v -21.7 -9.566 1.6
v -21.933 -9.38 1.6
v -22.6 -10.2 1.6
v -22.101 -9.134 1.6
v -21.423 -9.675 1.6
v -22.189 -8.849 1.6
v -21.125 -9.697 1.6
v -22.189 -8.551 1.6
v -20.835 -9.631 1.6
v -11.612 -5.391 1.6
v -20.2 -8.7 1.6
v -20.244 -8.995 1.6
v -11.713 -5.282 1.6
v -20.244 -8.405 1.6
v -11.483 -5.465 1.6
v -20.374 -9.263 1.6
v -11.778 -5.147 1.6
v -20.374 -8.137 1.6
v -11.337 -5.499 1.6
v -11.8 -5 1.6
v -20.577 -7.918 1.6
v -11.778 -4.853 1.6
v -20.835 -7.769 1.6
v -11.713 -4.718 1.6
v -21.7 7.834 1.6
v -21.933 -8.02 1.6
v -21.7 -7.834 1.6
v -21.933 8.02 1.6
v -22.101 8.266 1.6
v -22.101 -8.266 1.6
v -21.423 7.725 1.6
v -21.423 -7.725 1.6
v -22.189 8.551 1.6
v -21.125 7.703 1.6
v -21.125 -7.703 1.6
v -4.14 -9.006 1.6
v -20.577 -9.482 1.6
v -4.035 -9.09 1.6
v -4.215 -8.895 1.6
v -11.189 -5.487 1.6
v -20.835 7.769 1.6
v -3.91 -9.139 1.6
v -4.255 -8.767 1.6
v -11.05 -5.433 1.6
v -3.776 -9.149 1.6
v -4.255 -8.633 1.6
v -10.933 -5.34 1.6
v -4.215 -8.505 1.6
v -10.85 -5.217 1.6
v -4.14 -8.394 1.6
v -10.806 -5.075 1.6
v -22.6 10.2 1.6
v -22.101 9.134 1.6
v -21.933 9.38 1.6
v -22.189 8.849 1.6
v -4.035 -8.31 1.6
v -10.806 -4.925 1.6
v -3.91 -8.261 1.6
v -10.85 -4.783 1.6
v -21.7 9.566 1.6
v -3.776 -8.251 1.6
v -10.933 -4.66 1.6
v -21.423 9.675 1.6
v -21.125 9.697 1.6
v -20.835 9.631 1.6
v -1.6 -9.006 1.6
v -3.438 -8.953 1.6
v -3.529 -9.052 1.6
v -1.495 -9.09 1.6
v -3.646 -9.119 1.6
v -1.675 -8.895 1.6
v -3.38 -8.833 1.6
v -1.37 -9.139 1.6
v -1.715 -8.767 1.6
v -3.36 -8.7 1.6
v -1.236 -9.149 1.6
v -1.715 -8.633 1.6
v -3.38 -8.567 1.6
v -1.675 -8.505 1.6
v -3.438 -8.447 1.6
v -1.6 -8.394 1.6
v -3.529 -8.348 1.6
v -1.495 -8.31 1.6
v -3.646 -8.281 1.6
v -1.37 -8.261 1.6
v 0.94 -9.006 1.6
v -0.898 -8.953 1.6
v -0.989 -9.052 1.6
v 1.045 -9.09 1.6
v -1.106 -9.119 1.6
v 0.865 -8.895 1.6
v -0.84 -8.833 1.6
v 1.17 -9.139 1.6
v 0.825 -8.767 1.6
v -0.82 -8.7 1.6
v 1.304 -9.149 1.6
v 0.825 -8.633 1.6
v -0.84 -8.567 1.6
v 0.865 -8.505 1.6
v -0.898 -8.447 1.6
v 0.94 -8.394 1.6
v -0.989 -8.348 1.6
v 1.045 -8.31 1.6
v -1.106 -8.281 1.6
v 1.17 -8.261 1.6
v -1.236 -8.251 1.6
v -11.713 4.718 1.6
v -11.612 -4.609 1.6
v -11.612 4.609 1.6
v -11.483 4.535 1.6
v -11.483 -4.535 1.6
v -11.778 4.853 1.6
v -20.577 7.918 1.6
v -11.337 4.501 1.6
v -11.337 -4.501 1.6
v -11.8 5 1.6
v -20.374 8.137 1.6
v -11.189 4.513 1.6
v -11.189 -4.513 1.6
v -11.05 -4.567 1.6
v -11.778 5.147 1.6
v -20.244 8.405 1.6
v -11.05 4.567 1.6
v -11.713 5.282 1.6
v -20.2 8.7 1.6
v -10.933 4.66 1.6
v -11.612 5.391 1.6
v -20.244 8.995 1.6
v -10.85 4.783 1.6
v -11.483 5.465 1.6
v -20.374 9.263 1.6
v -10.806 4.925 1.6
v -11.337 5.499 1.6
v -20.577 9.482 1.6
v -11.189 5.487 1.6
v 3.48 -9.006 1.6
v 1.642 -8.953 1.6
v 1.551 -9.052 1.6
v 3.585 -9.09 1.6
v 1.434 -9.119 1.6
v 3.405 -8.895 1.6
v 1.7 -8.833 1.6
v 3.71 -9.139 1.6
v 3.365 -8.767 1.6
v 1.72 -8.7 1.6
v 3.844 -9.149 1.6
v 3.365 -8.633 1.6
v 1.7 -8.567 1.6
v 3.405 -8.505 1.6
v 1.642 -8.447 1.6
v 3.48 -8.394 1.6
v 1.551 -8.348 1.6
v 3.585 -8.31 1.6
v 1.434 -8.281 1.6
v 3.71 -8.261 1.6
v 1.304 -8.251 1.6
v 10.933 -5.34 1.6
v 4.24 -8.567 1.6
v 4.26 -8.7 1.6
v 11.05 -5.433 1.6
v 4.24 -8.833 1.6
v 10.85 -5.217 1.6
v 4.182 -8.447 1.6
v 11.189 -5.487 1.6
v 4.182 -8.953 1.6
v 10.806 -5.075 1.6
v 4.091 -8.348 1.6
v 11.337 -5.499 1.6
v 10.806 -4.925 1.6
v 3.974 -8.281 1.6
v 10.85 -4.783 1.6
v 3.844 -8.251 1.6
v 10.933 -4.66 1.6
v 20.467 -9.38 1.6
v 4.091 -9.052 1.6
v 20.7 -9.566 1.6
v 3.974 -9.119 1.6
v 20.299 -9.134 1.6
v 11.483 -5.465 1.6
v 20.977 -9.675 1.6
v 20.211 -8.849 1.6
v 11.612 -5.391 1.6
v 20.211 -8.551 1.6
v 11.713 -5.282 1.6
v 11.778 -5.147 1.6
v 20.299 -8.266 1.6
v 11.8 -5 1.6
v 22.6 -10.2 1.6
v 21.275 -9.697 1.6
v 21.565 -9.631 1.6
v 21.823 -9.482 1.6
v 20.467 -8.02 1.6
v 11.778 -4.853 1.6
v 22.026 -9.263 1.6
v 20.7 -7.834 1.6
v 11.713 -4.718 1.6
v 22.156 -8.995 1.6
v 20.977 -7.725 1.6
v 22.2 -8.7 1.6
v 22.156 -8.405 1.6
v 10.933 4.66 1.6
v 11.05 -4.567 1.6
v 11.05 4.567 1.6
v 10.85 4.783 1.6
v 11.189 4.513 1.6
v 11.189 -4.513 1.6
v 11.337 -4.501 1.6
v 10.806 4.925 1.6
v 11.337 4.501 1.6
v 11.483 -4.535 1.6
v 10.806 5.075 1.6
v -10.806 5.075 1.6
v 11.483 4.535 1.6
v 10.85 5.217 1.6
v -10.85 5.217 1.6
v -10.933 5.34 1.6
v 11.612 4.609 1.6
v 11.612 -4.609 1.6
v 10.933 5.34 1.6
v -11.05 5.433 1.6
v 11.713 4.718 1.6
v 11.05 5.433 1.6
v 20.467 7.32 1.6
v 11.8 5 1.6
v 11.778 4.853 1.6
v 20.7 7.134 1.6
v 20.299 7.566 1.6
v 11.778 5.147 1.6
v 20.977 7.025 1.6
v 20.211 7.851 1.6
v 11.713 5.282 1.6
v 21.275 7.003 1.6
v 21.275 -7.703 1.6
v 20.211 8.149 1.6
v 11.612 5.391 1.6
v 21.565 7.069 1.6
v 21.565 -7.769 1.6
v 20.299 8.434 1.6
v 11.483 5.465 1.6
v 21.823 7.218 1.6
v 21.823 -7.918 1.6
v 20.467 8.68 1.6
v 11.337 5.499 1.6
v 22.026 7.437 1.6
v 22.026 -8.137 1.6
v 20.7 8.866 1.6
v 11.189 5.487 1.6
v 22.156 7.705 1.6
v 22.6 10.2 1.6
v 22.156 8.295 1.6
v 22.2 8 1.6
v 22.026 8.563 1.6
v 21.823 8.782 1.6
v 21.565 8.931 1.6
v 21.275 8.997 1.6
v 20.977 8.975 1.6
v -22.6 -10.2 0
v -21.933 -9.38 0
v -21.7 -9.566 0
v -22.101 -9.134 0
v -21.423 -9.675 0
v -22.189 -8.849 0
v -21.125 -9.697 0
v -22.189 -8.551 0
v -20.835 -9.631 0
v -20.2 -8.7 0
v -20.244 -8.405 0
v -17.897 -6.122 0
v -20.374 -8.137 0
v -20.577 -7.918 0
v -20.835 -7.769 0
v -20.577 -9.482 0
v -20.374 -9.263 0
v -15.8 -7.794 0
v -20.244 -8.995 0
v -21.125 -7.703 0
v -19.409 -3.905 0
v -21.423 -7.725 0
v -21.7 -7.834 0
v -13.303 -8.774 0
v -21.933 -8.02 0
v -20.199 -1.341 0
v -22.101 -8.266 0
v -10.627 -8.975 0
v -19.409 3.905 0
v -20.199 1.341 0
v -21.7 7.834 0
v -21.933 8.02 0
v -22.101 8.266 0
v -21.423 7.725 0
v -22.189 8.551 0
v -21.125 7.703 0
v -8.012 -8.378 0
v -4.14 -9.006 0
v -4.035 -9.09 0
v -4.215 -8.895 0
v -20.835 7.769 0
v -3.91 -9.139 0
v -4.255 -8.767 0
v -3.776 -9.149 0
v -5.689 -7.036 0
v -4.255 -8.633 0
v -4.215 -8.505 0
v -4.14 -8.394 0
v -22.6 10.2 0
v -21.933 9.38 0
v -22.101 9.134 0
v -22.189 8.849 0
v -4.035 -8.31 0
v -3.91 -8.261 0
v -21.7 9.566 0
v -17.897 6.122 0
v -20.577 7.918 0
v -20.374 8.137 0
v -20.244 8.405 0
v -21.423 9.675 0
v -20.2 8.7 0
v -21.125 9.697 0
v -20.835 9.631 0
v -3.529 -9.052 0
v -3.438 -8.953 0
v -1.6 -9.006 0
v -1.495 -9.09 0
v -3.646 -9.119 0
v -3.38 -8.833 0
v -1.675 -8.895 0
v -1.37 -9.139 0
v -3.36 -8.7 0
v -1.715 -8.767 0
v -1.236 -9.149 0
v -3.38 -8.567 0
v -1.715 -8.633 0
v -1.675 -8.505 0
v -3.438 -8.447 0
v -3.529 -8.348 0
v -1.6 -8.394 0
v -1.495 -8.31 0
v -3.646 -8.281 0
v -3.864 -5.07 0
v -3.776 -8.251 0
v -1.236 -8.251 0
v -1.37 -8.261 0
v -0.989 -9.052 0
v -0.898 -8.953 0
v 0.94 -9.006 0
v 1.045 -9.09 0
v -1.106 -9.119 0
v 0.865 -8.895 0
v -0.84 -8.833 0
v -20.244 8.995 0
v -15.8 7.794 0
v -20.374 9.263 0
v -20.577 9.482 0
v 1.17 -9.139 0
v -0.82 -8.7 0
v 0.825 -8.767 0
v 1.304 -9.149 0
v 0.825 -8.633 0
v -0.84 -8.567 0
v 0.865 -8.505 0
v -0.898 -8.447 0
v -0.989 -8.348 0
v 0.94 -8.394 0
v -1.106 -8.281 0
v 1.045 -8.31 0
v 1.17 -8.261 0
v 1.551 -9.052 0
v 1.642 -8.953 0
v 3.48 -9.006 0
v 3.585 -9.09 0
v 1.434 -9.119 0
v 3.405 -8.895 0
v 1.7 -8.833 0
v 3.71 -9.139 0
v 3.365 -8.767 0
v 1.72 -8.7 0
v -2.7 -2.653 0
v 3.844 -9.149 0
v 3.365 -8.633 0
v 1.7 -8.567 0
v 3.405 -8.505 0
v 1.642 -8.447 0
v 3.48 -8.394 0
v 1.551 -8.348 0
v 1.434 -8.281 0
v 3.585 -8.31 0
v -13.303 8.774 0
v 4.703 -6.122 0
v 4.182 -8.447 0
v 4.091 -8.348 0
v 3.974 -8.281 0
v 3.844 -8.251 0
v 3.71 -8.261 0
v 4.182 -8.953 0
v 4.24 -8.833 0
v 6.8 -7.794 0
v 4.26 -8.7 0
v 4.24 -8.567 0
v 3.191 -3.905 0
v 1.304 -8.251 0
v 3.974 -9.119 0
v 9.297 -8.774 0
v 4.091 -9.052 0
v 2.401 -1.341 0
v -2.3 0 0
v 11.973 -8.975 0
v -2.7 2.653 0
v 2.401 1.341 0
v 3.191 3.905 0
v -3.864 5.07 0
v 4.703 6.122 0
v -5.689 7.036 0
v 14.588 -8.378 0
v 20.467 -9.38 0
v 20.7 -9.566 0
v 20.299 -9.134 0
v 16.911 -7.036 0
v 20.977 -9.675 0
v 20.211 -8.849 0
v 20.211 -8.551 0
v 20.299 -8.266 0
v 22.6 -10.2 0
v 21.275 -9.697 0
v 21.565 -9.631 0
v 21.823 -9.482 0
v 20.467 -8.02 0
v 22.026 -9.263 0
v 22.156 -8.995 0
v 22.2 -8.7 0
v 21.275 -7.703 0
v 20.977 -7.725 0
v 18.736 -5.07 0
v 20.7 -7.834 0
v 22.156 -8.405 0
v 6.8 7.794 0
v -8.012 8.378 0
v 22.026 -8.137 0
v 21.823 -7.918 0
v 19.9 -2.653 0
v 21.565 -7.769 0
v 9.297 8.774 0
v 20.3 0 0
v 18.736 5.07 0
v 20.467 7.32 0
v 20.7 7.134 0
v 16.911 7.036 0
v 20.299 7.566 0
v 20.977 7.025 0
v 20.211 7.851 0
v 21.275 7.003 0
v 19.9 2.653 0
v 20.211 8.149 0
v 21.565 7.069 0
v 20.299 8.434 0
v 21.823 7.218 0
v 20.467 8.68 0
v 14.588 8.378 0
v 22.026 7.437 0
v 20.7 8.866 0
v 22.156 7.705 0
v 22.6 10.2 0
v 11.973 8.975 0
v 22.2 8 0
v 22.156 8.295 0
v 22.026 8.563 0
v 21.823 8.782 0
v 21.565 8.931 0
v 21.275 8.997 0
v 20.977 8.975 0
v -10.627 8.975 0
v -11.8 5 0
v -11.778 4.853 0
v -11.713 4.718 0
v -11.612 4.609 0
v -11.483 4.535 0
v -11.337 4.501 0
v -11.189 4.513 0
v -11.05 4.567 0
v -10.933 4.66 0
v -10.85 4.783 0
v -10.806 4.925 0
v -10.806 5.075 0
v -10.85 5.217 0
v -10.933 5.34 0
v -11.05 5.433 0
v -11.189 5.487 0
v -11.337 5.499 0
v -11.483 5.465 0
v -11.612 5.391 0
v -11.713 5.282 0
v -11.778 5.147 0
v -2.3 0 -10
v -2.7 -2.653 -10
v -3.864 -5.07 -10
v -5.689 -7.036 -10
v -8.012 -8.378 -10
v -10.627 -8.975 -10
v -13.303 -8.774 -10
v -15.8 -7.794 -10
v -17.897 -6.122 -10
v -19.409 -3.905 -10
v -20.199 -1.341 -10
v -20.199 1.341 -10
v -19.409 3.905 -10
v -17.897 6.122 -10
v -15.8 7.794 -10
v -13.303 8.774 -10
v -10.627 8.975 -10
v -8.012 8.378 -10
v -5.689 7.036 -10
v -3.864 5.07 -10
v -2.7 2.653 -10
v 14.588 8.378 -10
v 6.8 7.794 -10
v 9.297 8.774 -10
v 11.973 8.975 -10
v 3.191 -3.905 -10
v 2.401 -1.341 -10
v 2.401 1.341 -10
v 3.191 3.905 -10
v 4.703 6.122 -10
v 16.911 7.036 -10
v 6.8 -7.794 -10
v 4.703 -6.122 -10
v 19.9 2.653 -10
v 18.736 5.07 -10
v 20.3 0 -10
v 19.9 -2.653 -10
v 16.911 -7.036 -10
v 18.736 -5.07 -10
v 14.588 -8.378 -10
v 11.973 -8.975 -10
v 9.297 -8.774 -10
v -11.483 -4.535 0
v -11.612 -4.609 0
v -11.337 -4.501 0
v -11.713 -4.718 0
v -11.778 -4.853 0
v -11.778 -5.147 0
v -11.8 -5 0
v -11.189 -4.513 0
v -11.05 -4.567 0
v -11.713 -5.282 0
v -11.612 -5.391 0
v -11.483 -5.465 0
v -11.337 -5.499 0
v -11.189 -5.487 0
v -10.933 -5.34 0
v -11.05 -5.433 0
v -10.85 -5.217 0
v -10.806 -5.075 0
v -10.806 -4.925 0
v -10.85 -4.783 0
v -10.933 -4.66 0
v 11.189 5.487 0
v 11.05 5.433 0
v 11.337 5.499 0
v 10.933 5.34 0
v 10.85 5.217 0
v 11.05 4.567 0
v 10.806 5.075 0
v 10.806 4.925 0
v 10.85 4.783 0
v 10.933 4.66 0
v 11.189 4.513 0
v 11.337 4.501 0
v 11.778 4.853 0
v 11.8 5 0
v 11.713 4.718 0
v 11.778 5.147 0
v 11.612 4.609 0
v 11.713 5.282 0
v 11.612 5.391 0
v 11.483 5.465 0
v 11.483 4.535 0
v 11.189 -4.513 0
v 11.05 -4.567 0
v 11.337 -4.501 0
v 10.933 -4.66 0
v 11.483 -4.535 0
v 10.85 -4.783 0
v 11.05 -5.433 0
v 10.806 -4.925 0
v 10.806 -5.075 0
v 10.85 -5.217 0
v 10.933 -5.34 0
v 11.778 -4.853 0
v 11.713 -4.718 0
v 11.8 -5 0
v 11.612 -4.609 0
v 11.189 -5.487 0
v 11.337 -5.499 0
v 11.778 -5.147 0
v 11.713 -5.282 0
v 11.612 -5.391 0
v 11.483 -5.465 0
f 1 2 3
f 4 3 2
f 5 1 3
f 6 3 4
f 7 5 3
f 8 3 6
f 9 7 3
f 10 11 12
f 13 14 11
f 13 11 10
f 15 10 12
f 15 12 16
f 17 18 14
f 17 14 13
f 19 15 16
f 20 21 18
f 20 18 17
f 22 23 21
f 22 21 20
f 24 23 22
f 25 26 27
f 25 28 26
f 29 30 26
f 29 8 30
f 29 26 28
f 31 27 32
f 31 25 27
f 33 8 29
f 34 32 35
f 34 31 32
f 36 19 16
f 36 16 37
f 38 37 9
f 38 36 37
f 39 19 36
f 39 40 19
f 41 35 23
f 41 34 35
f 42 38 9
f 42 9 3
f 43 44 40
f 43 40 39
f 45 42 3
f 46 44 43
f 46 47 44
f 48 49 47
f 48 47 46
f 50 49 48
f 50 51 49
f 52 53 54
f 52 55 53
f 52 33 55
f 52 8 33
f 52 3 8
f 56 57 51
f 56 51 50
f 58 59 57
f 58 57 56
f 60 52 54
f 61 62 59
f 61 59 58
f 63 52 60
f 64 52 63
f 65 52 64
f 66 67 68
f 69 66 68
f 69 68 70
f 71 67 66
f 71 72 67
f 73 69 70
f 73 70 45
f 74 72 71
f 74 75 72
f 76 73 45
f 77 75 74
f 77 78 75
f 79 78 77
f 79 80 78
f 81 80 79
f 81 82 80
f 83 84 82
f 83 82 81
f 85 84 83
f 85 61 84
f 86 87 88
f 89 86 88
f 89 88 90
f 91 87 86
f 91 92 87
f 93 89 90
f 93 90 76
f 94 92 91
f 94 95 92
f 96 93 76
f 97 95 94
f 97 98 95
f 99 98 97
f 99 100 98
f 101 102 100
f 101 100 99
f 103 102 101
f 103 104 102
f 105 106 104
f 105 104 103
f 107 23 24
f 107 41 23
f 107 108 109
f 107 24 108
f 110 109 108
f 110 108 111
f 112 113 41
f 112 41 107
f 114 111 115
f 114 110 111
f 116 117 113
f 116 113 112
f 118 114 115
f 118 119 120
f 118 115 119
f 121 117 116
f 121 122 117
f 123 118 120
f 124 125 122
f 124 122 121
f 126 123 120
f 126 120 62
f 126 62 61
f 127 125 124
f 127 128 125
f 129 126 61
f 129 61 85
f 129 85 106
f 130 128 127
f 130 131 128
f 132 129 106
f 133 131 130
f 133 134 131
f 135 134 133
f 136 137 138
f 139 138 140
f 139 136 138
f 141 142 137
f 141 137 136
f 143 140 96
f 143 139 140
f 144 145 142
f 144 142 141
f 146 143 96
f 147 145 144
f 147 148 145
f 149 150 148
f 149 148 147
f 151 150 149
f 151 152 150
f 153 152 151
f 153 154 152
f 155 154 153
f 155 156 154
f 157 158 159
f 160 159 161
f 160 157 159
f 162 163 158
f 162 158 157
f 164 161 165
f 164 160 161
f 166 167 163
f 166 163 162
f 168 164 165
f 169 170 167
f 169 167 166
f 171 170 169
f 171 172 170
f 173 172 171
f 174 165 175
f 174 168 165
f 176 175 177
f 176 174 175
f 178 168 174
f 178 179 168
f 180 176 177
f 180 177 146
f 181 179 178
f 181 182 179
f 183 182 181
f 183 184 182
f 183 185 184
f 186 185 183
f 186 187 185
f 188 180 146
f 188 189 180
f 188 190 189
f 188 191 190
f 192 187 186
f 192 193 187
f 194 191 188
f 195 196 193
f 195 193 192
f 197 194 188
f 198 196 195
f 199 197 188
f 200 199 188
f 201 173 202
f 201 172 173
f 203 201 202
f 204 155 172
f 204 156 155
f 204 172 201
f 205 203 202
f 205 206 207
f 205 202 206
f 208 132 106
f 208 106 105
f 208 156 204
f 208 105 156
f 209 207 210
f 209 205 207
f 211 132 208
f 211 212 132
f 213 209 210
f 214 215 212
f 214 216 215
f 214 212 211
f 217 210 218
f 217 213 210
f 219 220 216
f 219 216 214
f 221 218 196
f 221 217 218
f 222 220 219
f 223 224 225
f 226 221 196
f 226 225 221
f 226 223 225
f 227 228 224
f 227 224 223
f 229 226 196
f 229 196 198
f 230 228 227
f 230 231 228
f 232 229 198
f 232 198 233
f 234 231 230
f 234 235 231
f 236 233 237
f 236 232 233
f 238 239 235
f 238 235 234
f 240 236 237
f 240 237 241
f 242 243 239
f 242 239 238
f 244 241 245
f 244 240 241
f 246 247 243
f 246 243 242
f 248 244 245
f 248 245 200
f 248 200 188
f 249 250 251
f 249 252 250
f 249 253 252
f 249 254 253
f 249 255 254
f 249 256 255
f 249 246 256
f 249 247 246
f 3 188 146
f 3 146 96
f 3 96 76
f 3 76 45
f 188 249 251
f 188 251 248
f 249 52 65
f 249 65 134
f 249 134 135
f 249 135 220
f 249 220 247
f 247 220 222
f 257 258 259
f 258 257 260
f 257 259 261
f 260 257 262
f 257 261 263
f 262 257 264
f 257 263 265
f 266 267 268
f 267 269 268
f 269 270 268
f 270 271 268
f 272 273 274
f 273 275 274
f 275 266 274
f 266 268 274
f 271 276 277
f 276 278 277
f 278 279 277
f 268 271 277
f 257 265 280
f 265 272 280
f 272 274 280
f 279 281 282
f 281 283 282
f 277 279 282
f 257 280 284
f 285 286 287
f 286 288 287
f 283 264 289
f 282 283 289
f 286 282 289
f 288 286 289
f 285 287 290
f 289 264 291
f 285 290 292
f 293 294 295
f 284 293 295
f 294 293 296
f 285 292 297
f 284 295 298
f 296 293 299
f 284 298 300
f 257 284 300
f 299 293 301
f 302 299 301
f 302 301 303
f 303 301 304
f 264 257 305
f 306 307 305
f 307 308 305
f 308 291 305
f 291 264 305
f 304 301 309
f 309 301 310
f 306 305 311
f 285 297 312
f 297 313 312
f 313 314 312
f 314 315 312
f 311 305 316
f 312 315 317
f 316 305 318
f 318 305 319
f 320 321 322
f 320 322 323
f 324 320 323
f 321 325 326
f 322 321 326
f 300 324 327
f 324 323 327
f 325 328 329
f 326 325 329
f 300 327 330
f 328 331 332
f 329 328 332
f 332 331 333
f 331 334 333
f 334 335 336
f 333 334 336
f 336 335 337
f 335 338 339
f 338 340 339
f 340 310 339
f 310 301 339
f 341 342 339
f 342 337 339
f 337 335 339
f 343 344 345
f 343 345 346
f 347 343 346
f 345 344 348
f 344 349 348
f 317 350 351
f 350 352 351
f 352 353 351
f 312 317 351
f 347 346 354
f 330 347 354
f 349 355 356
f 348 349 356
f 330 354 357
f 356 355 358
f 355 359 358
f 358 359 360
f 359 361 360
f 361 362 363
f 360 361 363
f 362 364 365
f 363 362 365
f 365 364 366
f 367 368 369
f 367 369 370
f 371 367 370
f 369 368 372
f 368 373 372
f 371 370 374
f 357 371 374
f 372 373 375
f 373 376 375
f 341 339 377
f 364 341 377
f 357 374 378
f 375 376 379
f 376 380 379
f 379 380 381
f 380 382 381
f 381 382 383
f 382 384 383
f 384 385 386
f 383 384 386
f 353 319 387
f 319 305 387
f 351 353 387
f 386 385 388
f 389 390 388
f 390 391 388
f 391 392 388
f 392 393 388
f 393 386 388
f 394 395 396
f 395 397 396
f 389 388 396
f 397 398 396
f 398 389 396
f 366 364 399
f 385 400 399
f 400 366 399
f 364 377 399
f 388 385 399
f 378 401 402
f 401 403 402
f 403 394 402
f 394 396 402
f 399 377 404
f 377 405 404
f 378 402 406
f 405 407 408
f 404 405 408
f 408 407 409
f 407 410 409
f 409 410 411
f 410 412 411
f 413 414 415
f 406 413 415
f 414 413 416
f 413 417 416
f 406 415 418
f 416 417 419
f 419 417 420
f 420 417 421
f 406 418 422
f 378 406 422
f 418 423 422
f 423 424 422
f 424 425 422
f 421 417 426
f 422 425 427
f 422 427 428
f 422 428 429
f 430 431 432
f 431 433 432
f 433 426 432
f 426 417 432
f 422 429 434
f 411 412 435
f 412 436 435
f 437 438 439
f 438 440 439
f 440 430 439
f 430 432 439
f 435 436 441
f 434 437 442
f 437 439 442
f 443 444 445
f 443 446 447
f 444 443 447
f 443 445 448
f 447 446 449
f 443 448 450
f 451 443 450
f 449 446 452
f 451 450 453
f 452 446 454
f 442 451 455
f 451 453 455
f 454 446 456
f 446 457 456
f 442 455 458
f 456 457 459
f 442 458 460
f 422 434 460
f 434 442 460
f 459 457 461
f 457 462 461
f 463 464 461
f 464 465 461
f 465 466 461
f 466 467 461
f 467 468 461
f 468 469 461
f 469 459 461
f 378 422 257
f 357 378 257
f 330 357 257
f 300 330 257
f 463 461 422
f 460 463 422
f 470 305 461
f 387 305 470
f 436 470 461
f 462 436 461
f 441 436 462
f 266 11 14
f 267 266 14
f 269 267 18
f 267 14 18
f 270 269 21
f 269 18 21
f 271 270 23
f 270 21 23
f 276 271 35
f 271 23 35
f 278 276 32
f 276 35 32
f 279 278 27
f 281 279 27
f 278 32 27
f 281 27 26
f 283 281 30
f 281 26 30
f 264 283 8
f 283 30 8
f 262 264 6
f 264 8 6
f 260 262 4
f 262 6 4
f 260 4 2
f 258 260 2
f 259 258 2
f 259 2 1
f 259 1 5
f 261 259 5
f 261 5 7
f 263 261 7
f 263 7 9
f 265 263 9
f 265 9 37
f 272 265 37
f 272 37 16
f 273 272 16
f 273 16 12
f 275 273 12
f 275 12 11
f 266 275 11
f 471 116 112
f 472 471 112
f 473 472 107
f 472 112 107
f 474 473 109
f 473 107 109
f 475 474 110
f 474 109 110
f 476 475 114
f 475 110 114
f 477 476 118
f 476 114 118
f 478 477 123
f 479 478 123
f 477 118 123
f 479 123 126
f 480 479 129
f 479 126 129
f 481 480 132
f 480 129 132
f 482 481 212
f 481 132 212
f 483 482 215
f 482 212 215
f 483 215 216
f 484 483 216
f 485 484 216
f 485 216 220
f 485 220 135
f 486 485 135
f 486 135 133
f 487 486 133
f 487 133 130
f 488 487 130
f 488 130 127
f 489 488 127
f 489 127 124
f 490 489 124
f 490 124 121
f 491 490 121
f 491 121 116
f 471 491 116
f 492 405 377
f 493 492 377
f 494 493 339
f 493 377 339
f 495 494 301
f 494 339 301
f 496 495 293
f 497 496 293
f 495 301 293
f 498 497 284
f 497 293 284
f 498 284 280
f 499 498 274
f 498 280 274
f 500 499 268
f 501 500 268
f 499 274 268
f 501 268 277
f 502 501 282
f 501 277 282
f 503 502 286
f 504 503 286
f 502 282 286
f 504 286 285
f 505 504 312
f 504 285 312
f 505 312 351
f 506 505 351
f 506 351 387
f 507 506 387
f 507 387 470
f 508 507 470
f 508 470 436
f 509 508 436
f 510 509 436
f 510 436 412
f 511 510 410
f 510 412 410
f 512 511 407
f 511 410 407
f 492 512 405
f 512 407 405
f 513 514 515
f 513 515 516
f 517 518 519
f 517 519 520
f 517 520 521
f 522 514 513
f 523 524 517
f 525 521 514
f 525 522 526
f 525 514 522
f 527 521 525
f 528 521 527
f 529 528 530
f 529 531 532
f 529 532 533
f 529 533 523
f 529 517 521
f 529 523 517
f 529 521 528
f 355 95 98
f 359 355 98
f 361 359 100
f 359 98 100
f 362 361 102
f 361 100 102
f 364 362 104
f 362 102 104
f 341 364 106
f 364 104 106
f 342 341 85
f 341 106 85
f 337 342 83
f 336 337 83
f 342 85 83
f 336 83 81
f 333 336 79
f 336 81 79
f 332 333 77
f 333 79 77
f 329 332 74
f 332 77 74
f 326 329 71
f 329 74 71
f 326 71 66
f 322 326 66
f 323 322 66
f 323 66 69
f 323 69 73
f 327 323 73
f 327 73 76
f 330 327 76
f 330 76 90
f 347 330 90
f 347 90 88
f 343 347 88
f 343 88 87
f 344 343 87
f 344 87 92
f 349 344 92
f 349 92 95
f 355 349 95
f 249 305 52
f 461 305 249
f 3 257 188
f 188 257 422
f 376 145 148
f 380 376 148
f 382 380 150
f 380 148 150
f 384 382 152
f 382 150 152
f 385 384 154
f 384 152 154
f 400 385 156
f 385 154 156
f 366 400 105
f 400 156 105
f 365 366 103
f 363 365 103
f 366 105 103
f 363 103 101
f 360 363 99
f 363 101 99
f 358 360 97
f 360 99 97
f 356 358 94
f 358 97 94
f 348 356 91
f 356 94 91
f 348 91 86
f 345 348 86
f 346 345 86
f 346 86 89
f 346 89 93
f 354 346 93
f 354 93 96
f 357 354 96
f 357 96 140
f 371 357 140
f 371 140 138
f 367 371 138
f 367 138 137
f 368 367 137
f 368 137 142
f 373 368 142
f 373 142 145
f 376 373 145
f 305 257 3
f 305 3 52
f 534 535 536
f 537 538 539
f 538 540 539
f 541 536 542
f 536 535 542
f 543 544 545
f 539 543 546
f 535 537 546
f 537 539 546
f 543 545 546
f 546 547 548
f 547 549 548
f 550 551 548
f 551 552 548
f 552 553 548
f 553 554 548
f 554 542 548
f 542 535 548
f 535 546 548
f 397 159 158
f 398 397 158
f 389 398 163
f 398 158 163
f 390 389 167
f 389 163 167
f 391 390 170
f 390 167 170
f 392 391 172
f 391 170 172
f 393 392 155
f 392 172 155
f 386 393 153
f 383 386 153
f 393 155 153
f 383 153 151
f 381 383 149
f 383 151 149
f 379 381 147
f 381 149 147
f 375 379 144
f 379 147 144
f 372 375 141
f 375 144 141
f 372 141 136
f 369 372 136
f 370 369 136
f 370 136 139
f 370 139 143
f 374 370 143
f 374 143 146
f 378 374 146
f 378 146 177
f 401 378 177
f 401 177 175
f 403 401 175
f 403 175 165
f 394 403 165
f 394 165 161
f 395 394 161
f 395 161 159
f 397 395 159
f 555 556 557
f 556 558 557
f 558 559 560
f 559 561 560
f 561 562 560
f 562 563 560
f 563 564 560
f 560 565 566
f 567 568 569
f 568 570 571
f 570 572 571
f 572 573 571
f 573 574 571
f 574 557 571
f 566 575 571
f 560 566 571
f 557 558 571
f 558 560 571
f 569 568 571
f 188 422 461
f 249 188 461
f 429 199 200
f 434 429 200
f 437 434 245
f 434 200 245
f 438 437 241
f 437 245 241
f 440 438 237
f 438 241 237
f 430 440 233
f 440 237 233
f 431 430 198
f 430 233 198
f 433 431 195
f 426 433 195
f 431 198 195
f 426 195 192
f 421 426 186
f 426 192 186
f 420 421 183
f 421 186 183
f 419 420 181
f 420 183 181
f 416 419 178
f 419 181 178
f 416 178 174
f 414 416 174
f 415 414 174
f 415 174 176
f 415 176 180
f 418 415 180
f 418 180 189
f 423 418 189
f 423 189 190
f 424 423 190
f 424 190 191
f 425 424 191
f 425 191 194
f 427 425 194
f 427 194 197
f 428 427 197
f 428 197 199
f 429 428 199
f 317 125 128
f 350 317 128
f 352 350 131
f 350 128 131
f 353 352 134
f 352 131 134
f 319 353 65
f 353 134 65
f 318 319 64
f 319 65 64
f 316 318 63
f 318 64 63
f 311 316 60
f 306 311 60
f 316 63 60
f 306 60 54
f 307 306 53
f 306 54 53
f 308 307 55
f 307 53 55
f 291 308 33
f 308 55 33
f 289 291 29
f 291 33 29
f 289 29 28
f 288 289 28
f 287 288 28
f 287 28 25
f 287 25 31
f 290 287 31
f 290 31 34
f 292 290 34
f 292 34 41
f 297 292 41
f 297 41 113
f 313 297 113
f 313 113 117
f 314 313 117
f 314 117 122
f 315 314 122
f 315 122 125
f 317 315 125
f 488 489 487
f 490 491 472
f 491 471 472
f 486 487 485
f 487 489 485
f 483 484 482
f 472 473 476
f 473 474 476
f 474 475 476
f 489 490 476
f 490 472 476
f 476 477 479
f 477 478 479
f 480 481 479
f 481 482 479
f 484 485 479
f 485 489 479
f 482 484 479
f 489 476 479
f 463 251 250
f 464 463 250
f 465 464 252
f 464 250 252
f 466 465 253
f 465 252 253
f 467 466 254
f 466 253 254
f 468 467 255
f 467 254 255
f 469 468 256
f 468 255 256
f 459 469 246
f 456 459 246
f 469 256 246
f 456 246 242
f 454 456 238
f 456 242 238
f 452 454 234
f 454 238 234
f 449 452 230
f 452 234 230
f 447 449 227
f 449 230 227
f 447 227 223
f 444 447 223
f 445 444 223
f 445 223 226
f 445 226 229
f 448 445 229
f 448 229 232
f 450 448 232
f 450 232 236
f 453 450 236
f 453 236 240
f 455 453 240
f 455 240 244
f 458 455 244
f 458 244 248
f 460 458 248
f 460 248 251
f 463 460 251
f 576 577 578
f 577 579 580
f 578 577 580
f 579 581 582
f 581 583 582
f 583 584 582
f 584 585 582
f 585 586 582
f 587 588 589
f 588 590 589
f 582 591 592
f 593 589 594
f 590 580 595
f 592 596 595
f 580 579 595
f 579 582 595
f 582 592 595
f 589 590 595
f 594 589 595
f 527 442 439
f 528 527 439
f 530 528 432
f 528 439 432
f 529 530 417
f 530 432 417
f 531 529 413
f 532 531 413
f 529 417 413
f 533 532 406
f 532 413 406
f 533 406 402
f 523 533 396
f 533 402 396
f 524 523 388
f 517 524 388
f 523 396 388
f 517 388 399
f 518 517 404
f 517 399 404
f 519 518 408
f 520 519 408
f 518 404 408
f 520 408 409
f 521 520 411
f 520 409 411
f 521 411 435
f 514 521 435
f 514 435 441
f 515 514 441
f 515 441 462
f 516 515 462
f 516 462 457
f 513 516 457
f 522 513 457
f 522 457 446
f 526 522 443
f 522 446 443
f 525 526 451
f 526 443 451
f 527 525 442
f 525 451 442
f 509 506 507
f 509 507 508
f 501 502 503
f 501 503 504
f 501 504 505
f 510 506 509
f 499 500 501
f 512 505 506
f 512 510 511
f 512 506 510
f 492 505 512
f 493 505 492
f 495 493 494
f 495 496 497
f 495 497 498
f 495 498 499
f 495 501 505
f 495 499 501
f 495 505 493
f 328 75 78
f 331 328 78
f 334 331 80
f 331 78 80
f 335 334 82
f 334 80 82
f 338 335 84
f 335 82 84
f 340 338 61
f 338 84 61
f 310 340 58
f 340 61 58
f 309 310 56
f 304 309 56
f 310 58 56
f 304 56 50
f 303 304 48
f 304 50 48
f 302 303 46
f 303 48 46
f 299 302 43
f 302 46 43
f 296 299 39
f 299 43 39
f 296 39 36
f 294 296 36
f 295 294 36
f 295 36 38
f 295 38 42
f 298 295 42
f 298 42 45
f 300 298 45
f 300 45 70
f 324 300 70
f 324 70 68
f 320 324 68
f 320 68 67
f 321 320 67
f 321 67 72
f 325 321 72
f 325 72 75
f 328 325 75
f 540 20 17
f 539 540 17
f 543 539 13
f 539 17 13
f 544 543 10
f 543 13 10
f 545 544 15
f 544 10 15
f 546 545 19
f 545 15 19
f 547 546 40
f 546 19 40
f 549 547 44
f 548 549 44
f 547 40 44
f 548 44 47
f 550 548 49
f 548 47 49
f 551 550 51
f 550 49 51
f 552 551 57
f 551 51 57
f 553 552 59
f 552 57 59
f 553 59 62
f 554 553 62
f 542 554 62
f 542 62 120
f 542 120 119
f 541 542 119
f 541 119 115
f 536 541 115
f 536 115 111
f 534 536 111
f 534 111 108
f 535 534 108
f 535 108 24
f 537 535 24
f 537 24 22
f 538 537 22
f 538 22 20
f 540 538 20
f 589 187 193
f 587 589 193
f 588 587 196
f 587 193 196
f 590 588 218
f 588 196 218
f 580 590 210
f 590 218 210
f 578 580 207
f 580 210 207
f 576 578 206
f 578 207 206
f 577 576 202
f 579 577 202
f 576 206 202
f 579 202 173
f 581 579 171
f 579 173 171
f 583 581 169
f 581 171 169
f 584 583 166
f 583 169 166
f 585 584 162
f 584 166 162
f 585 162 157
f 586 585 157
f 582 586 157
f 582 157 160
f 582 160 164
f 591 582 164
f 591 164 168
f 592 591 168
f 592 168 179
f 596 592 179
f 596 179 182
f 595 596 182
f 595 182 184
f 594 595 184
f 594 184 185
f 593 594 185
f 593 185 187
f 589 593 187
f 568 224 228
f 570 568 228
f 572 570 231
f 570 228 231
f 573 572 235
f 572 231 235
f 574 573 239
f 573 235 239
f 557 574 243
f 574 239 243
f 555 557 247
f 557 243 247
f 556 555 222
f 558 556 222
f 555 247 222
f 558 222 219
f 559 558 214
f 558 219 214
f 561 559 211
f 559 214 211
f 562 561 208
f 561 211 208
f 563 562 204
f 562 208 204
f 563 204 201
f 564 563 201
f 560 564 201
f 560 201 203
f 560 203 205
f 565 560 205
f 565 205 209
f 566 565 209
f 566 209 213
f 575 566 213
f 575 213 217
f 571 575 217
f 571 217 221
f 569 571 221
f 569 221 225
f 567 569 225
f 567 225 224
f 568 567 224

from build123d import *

# Parameters (mm, degrees)
SKETCH_1_W          = 45.2
SKETCH_1_H          = 20.4
EXTRUDE_1_DEPTH     = 1.6
SKETCH_2_R          = 1
SKETCH_2_R_2        = 0.45
CUT_EXTRUDE_1_DEPTH = 25.846730167
SKETCH_3_R          = 0.5
CUT_EXTRUDE_2_DEPTH = 25.846730167
SKETCH_4_R          = 9
EXTRUDE_2_DEPTH     = 10


with BuildPart() as part:
    # Эскиз1 → Бобышка-Вытянуть1 (new body)
    with BuildSketch(Plane.XY):
        Rectangle(SKETCH_1_W, SKETCH_1_H)
    extrude(amount=EXTRUDE_1_DEPTH)

    # Эскиз2 → Вырез-Вытянуть1 (cut, through all)
    with BuildSketch(Plane.XY.offset(1.6)):
        with Locations((-21.2, 8.7)):
            Circle(SKETCH_2_R)
        with Locations((-21.2, -8.7)):
            Circle(SKETCH_2_R)
        with Locations((21.2, -8.7)):
            Circle(SKETCH_2_R)
        with Locations((21.2, 8)):
            Circle(SKETCH_2_R)
        with Locations((-3.81, -8.7)):
            Circle(SKETCH_2_R_2)
        with Locations((-1.27, -8.7)):
            Circle(SKETCH_2_R_2)
        with Locations((1.27, -8.7)):
            Circle(SKETCH_2_R_2)
        with Locations((3.81, -8.7)):
            Circle(SKETCH_2_R_2)
    extrude(amount=-CUT_EXTRUDE_1_DEPTH, mode=Mode.SUBTRACT)

    # Эскиз3 → Вырез-Вытянуть2 (cut, through all)
    with BuildSketch(Plane.XY.offset(1.6)):
        with Locations((11.3, 5)):
            Circle(SKETCH_3_R)
        with Locations((11.3, -5)):
            Circle(SKETCH_3_R)
        with Locations(Location((-11.3, -5, 0), (0, 0, 180))):
            Circle(SKETCH_3_R)
        with Locations(Location((-11.3, 5, 0), (0, 0, 180))):
            Circle(SKETCH_3_R)
    extrude(amount=-CUT_EXTRUDE_2_DEPTH, mode=Mode.SUBTRACT)

    # Эскиз4 → Бобышка-Вытянуть2 (add)
    with BuildSketch(Plane(origin=(0, 0, 0), x_dir=(-1, 0, 0), z_dir=(0, 0, -1))):
        with Locations(Location((-11.3, 0, 0), (0, 0, 180))):
            Circle(SKETCH_4_R)
        with Locations(Location((11.3, 0, 0), (0, 0, 180))):
            Circle(SKETCH_4_R)
    extrude(amount=EXTRUDE_2_DEPTH)


solid = part.part
